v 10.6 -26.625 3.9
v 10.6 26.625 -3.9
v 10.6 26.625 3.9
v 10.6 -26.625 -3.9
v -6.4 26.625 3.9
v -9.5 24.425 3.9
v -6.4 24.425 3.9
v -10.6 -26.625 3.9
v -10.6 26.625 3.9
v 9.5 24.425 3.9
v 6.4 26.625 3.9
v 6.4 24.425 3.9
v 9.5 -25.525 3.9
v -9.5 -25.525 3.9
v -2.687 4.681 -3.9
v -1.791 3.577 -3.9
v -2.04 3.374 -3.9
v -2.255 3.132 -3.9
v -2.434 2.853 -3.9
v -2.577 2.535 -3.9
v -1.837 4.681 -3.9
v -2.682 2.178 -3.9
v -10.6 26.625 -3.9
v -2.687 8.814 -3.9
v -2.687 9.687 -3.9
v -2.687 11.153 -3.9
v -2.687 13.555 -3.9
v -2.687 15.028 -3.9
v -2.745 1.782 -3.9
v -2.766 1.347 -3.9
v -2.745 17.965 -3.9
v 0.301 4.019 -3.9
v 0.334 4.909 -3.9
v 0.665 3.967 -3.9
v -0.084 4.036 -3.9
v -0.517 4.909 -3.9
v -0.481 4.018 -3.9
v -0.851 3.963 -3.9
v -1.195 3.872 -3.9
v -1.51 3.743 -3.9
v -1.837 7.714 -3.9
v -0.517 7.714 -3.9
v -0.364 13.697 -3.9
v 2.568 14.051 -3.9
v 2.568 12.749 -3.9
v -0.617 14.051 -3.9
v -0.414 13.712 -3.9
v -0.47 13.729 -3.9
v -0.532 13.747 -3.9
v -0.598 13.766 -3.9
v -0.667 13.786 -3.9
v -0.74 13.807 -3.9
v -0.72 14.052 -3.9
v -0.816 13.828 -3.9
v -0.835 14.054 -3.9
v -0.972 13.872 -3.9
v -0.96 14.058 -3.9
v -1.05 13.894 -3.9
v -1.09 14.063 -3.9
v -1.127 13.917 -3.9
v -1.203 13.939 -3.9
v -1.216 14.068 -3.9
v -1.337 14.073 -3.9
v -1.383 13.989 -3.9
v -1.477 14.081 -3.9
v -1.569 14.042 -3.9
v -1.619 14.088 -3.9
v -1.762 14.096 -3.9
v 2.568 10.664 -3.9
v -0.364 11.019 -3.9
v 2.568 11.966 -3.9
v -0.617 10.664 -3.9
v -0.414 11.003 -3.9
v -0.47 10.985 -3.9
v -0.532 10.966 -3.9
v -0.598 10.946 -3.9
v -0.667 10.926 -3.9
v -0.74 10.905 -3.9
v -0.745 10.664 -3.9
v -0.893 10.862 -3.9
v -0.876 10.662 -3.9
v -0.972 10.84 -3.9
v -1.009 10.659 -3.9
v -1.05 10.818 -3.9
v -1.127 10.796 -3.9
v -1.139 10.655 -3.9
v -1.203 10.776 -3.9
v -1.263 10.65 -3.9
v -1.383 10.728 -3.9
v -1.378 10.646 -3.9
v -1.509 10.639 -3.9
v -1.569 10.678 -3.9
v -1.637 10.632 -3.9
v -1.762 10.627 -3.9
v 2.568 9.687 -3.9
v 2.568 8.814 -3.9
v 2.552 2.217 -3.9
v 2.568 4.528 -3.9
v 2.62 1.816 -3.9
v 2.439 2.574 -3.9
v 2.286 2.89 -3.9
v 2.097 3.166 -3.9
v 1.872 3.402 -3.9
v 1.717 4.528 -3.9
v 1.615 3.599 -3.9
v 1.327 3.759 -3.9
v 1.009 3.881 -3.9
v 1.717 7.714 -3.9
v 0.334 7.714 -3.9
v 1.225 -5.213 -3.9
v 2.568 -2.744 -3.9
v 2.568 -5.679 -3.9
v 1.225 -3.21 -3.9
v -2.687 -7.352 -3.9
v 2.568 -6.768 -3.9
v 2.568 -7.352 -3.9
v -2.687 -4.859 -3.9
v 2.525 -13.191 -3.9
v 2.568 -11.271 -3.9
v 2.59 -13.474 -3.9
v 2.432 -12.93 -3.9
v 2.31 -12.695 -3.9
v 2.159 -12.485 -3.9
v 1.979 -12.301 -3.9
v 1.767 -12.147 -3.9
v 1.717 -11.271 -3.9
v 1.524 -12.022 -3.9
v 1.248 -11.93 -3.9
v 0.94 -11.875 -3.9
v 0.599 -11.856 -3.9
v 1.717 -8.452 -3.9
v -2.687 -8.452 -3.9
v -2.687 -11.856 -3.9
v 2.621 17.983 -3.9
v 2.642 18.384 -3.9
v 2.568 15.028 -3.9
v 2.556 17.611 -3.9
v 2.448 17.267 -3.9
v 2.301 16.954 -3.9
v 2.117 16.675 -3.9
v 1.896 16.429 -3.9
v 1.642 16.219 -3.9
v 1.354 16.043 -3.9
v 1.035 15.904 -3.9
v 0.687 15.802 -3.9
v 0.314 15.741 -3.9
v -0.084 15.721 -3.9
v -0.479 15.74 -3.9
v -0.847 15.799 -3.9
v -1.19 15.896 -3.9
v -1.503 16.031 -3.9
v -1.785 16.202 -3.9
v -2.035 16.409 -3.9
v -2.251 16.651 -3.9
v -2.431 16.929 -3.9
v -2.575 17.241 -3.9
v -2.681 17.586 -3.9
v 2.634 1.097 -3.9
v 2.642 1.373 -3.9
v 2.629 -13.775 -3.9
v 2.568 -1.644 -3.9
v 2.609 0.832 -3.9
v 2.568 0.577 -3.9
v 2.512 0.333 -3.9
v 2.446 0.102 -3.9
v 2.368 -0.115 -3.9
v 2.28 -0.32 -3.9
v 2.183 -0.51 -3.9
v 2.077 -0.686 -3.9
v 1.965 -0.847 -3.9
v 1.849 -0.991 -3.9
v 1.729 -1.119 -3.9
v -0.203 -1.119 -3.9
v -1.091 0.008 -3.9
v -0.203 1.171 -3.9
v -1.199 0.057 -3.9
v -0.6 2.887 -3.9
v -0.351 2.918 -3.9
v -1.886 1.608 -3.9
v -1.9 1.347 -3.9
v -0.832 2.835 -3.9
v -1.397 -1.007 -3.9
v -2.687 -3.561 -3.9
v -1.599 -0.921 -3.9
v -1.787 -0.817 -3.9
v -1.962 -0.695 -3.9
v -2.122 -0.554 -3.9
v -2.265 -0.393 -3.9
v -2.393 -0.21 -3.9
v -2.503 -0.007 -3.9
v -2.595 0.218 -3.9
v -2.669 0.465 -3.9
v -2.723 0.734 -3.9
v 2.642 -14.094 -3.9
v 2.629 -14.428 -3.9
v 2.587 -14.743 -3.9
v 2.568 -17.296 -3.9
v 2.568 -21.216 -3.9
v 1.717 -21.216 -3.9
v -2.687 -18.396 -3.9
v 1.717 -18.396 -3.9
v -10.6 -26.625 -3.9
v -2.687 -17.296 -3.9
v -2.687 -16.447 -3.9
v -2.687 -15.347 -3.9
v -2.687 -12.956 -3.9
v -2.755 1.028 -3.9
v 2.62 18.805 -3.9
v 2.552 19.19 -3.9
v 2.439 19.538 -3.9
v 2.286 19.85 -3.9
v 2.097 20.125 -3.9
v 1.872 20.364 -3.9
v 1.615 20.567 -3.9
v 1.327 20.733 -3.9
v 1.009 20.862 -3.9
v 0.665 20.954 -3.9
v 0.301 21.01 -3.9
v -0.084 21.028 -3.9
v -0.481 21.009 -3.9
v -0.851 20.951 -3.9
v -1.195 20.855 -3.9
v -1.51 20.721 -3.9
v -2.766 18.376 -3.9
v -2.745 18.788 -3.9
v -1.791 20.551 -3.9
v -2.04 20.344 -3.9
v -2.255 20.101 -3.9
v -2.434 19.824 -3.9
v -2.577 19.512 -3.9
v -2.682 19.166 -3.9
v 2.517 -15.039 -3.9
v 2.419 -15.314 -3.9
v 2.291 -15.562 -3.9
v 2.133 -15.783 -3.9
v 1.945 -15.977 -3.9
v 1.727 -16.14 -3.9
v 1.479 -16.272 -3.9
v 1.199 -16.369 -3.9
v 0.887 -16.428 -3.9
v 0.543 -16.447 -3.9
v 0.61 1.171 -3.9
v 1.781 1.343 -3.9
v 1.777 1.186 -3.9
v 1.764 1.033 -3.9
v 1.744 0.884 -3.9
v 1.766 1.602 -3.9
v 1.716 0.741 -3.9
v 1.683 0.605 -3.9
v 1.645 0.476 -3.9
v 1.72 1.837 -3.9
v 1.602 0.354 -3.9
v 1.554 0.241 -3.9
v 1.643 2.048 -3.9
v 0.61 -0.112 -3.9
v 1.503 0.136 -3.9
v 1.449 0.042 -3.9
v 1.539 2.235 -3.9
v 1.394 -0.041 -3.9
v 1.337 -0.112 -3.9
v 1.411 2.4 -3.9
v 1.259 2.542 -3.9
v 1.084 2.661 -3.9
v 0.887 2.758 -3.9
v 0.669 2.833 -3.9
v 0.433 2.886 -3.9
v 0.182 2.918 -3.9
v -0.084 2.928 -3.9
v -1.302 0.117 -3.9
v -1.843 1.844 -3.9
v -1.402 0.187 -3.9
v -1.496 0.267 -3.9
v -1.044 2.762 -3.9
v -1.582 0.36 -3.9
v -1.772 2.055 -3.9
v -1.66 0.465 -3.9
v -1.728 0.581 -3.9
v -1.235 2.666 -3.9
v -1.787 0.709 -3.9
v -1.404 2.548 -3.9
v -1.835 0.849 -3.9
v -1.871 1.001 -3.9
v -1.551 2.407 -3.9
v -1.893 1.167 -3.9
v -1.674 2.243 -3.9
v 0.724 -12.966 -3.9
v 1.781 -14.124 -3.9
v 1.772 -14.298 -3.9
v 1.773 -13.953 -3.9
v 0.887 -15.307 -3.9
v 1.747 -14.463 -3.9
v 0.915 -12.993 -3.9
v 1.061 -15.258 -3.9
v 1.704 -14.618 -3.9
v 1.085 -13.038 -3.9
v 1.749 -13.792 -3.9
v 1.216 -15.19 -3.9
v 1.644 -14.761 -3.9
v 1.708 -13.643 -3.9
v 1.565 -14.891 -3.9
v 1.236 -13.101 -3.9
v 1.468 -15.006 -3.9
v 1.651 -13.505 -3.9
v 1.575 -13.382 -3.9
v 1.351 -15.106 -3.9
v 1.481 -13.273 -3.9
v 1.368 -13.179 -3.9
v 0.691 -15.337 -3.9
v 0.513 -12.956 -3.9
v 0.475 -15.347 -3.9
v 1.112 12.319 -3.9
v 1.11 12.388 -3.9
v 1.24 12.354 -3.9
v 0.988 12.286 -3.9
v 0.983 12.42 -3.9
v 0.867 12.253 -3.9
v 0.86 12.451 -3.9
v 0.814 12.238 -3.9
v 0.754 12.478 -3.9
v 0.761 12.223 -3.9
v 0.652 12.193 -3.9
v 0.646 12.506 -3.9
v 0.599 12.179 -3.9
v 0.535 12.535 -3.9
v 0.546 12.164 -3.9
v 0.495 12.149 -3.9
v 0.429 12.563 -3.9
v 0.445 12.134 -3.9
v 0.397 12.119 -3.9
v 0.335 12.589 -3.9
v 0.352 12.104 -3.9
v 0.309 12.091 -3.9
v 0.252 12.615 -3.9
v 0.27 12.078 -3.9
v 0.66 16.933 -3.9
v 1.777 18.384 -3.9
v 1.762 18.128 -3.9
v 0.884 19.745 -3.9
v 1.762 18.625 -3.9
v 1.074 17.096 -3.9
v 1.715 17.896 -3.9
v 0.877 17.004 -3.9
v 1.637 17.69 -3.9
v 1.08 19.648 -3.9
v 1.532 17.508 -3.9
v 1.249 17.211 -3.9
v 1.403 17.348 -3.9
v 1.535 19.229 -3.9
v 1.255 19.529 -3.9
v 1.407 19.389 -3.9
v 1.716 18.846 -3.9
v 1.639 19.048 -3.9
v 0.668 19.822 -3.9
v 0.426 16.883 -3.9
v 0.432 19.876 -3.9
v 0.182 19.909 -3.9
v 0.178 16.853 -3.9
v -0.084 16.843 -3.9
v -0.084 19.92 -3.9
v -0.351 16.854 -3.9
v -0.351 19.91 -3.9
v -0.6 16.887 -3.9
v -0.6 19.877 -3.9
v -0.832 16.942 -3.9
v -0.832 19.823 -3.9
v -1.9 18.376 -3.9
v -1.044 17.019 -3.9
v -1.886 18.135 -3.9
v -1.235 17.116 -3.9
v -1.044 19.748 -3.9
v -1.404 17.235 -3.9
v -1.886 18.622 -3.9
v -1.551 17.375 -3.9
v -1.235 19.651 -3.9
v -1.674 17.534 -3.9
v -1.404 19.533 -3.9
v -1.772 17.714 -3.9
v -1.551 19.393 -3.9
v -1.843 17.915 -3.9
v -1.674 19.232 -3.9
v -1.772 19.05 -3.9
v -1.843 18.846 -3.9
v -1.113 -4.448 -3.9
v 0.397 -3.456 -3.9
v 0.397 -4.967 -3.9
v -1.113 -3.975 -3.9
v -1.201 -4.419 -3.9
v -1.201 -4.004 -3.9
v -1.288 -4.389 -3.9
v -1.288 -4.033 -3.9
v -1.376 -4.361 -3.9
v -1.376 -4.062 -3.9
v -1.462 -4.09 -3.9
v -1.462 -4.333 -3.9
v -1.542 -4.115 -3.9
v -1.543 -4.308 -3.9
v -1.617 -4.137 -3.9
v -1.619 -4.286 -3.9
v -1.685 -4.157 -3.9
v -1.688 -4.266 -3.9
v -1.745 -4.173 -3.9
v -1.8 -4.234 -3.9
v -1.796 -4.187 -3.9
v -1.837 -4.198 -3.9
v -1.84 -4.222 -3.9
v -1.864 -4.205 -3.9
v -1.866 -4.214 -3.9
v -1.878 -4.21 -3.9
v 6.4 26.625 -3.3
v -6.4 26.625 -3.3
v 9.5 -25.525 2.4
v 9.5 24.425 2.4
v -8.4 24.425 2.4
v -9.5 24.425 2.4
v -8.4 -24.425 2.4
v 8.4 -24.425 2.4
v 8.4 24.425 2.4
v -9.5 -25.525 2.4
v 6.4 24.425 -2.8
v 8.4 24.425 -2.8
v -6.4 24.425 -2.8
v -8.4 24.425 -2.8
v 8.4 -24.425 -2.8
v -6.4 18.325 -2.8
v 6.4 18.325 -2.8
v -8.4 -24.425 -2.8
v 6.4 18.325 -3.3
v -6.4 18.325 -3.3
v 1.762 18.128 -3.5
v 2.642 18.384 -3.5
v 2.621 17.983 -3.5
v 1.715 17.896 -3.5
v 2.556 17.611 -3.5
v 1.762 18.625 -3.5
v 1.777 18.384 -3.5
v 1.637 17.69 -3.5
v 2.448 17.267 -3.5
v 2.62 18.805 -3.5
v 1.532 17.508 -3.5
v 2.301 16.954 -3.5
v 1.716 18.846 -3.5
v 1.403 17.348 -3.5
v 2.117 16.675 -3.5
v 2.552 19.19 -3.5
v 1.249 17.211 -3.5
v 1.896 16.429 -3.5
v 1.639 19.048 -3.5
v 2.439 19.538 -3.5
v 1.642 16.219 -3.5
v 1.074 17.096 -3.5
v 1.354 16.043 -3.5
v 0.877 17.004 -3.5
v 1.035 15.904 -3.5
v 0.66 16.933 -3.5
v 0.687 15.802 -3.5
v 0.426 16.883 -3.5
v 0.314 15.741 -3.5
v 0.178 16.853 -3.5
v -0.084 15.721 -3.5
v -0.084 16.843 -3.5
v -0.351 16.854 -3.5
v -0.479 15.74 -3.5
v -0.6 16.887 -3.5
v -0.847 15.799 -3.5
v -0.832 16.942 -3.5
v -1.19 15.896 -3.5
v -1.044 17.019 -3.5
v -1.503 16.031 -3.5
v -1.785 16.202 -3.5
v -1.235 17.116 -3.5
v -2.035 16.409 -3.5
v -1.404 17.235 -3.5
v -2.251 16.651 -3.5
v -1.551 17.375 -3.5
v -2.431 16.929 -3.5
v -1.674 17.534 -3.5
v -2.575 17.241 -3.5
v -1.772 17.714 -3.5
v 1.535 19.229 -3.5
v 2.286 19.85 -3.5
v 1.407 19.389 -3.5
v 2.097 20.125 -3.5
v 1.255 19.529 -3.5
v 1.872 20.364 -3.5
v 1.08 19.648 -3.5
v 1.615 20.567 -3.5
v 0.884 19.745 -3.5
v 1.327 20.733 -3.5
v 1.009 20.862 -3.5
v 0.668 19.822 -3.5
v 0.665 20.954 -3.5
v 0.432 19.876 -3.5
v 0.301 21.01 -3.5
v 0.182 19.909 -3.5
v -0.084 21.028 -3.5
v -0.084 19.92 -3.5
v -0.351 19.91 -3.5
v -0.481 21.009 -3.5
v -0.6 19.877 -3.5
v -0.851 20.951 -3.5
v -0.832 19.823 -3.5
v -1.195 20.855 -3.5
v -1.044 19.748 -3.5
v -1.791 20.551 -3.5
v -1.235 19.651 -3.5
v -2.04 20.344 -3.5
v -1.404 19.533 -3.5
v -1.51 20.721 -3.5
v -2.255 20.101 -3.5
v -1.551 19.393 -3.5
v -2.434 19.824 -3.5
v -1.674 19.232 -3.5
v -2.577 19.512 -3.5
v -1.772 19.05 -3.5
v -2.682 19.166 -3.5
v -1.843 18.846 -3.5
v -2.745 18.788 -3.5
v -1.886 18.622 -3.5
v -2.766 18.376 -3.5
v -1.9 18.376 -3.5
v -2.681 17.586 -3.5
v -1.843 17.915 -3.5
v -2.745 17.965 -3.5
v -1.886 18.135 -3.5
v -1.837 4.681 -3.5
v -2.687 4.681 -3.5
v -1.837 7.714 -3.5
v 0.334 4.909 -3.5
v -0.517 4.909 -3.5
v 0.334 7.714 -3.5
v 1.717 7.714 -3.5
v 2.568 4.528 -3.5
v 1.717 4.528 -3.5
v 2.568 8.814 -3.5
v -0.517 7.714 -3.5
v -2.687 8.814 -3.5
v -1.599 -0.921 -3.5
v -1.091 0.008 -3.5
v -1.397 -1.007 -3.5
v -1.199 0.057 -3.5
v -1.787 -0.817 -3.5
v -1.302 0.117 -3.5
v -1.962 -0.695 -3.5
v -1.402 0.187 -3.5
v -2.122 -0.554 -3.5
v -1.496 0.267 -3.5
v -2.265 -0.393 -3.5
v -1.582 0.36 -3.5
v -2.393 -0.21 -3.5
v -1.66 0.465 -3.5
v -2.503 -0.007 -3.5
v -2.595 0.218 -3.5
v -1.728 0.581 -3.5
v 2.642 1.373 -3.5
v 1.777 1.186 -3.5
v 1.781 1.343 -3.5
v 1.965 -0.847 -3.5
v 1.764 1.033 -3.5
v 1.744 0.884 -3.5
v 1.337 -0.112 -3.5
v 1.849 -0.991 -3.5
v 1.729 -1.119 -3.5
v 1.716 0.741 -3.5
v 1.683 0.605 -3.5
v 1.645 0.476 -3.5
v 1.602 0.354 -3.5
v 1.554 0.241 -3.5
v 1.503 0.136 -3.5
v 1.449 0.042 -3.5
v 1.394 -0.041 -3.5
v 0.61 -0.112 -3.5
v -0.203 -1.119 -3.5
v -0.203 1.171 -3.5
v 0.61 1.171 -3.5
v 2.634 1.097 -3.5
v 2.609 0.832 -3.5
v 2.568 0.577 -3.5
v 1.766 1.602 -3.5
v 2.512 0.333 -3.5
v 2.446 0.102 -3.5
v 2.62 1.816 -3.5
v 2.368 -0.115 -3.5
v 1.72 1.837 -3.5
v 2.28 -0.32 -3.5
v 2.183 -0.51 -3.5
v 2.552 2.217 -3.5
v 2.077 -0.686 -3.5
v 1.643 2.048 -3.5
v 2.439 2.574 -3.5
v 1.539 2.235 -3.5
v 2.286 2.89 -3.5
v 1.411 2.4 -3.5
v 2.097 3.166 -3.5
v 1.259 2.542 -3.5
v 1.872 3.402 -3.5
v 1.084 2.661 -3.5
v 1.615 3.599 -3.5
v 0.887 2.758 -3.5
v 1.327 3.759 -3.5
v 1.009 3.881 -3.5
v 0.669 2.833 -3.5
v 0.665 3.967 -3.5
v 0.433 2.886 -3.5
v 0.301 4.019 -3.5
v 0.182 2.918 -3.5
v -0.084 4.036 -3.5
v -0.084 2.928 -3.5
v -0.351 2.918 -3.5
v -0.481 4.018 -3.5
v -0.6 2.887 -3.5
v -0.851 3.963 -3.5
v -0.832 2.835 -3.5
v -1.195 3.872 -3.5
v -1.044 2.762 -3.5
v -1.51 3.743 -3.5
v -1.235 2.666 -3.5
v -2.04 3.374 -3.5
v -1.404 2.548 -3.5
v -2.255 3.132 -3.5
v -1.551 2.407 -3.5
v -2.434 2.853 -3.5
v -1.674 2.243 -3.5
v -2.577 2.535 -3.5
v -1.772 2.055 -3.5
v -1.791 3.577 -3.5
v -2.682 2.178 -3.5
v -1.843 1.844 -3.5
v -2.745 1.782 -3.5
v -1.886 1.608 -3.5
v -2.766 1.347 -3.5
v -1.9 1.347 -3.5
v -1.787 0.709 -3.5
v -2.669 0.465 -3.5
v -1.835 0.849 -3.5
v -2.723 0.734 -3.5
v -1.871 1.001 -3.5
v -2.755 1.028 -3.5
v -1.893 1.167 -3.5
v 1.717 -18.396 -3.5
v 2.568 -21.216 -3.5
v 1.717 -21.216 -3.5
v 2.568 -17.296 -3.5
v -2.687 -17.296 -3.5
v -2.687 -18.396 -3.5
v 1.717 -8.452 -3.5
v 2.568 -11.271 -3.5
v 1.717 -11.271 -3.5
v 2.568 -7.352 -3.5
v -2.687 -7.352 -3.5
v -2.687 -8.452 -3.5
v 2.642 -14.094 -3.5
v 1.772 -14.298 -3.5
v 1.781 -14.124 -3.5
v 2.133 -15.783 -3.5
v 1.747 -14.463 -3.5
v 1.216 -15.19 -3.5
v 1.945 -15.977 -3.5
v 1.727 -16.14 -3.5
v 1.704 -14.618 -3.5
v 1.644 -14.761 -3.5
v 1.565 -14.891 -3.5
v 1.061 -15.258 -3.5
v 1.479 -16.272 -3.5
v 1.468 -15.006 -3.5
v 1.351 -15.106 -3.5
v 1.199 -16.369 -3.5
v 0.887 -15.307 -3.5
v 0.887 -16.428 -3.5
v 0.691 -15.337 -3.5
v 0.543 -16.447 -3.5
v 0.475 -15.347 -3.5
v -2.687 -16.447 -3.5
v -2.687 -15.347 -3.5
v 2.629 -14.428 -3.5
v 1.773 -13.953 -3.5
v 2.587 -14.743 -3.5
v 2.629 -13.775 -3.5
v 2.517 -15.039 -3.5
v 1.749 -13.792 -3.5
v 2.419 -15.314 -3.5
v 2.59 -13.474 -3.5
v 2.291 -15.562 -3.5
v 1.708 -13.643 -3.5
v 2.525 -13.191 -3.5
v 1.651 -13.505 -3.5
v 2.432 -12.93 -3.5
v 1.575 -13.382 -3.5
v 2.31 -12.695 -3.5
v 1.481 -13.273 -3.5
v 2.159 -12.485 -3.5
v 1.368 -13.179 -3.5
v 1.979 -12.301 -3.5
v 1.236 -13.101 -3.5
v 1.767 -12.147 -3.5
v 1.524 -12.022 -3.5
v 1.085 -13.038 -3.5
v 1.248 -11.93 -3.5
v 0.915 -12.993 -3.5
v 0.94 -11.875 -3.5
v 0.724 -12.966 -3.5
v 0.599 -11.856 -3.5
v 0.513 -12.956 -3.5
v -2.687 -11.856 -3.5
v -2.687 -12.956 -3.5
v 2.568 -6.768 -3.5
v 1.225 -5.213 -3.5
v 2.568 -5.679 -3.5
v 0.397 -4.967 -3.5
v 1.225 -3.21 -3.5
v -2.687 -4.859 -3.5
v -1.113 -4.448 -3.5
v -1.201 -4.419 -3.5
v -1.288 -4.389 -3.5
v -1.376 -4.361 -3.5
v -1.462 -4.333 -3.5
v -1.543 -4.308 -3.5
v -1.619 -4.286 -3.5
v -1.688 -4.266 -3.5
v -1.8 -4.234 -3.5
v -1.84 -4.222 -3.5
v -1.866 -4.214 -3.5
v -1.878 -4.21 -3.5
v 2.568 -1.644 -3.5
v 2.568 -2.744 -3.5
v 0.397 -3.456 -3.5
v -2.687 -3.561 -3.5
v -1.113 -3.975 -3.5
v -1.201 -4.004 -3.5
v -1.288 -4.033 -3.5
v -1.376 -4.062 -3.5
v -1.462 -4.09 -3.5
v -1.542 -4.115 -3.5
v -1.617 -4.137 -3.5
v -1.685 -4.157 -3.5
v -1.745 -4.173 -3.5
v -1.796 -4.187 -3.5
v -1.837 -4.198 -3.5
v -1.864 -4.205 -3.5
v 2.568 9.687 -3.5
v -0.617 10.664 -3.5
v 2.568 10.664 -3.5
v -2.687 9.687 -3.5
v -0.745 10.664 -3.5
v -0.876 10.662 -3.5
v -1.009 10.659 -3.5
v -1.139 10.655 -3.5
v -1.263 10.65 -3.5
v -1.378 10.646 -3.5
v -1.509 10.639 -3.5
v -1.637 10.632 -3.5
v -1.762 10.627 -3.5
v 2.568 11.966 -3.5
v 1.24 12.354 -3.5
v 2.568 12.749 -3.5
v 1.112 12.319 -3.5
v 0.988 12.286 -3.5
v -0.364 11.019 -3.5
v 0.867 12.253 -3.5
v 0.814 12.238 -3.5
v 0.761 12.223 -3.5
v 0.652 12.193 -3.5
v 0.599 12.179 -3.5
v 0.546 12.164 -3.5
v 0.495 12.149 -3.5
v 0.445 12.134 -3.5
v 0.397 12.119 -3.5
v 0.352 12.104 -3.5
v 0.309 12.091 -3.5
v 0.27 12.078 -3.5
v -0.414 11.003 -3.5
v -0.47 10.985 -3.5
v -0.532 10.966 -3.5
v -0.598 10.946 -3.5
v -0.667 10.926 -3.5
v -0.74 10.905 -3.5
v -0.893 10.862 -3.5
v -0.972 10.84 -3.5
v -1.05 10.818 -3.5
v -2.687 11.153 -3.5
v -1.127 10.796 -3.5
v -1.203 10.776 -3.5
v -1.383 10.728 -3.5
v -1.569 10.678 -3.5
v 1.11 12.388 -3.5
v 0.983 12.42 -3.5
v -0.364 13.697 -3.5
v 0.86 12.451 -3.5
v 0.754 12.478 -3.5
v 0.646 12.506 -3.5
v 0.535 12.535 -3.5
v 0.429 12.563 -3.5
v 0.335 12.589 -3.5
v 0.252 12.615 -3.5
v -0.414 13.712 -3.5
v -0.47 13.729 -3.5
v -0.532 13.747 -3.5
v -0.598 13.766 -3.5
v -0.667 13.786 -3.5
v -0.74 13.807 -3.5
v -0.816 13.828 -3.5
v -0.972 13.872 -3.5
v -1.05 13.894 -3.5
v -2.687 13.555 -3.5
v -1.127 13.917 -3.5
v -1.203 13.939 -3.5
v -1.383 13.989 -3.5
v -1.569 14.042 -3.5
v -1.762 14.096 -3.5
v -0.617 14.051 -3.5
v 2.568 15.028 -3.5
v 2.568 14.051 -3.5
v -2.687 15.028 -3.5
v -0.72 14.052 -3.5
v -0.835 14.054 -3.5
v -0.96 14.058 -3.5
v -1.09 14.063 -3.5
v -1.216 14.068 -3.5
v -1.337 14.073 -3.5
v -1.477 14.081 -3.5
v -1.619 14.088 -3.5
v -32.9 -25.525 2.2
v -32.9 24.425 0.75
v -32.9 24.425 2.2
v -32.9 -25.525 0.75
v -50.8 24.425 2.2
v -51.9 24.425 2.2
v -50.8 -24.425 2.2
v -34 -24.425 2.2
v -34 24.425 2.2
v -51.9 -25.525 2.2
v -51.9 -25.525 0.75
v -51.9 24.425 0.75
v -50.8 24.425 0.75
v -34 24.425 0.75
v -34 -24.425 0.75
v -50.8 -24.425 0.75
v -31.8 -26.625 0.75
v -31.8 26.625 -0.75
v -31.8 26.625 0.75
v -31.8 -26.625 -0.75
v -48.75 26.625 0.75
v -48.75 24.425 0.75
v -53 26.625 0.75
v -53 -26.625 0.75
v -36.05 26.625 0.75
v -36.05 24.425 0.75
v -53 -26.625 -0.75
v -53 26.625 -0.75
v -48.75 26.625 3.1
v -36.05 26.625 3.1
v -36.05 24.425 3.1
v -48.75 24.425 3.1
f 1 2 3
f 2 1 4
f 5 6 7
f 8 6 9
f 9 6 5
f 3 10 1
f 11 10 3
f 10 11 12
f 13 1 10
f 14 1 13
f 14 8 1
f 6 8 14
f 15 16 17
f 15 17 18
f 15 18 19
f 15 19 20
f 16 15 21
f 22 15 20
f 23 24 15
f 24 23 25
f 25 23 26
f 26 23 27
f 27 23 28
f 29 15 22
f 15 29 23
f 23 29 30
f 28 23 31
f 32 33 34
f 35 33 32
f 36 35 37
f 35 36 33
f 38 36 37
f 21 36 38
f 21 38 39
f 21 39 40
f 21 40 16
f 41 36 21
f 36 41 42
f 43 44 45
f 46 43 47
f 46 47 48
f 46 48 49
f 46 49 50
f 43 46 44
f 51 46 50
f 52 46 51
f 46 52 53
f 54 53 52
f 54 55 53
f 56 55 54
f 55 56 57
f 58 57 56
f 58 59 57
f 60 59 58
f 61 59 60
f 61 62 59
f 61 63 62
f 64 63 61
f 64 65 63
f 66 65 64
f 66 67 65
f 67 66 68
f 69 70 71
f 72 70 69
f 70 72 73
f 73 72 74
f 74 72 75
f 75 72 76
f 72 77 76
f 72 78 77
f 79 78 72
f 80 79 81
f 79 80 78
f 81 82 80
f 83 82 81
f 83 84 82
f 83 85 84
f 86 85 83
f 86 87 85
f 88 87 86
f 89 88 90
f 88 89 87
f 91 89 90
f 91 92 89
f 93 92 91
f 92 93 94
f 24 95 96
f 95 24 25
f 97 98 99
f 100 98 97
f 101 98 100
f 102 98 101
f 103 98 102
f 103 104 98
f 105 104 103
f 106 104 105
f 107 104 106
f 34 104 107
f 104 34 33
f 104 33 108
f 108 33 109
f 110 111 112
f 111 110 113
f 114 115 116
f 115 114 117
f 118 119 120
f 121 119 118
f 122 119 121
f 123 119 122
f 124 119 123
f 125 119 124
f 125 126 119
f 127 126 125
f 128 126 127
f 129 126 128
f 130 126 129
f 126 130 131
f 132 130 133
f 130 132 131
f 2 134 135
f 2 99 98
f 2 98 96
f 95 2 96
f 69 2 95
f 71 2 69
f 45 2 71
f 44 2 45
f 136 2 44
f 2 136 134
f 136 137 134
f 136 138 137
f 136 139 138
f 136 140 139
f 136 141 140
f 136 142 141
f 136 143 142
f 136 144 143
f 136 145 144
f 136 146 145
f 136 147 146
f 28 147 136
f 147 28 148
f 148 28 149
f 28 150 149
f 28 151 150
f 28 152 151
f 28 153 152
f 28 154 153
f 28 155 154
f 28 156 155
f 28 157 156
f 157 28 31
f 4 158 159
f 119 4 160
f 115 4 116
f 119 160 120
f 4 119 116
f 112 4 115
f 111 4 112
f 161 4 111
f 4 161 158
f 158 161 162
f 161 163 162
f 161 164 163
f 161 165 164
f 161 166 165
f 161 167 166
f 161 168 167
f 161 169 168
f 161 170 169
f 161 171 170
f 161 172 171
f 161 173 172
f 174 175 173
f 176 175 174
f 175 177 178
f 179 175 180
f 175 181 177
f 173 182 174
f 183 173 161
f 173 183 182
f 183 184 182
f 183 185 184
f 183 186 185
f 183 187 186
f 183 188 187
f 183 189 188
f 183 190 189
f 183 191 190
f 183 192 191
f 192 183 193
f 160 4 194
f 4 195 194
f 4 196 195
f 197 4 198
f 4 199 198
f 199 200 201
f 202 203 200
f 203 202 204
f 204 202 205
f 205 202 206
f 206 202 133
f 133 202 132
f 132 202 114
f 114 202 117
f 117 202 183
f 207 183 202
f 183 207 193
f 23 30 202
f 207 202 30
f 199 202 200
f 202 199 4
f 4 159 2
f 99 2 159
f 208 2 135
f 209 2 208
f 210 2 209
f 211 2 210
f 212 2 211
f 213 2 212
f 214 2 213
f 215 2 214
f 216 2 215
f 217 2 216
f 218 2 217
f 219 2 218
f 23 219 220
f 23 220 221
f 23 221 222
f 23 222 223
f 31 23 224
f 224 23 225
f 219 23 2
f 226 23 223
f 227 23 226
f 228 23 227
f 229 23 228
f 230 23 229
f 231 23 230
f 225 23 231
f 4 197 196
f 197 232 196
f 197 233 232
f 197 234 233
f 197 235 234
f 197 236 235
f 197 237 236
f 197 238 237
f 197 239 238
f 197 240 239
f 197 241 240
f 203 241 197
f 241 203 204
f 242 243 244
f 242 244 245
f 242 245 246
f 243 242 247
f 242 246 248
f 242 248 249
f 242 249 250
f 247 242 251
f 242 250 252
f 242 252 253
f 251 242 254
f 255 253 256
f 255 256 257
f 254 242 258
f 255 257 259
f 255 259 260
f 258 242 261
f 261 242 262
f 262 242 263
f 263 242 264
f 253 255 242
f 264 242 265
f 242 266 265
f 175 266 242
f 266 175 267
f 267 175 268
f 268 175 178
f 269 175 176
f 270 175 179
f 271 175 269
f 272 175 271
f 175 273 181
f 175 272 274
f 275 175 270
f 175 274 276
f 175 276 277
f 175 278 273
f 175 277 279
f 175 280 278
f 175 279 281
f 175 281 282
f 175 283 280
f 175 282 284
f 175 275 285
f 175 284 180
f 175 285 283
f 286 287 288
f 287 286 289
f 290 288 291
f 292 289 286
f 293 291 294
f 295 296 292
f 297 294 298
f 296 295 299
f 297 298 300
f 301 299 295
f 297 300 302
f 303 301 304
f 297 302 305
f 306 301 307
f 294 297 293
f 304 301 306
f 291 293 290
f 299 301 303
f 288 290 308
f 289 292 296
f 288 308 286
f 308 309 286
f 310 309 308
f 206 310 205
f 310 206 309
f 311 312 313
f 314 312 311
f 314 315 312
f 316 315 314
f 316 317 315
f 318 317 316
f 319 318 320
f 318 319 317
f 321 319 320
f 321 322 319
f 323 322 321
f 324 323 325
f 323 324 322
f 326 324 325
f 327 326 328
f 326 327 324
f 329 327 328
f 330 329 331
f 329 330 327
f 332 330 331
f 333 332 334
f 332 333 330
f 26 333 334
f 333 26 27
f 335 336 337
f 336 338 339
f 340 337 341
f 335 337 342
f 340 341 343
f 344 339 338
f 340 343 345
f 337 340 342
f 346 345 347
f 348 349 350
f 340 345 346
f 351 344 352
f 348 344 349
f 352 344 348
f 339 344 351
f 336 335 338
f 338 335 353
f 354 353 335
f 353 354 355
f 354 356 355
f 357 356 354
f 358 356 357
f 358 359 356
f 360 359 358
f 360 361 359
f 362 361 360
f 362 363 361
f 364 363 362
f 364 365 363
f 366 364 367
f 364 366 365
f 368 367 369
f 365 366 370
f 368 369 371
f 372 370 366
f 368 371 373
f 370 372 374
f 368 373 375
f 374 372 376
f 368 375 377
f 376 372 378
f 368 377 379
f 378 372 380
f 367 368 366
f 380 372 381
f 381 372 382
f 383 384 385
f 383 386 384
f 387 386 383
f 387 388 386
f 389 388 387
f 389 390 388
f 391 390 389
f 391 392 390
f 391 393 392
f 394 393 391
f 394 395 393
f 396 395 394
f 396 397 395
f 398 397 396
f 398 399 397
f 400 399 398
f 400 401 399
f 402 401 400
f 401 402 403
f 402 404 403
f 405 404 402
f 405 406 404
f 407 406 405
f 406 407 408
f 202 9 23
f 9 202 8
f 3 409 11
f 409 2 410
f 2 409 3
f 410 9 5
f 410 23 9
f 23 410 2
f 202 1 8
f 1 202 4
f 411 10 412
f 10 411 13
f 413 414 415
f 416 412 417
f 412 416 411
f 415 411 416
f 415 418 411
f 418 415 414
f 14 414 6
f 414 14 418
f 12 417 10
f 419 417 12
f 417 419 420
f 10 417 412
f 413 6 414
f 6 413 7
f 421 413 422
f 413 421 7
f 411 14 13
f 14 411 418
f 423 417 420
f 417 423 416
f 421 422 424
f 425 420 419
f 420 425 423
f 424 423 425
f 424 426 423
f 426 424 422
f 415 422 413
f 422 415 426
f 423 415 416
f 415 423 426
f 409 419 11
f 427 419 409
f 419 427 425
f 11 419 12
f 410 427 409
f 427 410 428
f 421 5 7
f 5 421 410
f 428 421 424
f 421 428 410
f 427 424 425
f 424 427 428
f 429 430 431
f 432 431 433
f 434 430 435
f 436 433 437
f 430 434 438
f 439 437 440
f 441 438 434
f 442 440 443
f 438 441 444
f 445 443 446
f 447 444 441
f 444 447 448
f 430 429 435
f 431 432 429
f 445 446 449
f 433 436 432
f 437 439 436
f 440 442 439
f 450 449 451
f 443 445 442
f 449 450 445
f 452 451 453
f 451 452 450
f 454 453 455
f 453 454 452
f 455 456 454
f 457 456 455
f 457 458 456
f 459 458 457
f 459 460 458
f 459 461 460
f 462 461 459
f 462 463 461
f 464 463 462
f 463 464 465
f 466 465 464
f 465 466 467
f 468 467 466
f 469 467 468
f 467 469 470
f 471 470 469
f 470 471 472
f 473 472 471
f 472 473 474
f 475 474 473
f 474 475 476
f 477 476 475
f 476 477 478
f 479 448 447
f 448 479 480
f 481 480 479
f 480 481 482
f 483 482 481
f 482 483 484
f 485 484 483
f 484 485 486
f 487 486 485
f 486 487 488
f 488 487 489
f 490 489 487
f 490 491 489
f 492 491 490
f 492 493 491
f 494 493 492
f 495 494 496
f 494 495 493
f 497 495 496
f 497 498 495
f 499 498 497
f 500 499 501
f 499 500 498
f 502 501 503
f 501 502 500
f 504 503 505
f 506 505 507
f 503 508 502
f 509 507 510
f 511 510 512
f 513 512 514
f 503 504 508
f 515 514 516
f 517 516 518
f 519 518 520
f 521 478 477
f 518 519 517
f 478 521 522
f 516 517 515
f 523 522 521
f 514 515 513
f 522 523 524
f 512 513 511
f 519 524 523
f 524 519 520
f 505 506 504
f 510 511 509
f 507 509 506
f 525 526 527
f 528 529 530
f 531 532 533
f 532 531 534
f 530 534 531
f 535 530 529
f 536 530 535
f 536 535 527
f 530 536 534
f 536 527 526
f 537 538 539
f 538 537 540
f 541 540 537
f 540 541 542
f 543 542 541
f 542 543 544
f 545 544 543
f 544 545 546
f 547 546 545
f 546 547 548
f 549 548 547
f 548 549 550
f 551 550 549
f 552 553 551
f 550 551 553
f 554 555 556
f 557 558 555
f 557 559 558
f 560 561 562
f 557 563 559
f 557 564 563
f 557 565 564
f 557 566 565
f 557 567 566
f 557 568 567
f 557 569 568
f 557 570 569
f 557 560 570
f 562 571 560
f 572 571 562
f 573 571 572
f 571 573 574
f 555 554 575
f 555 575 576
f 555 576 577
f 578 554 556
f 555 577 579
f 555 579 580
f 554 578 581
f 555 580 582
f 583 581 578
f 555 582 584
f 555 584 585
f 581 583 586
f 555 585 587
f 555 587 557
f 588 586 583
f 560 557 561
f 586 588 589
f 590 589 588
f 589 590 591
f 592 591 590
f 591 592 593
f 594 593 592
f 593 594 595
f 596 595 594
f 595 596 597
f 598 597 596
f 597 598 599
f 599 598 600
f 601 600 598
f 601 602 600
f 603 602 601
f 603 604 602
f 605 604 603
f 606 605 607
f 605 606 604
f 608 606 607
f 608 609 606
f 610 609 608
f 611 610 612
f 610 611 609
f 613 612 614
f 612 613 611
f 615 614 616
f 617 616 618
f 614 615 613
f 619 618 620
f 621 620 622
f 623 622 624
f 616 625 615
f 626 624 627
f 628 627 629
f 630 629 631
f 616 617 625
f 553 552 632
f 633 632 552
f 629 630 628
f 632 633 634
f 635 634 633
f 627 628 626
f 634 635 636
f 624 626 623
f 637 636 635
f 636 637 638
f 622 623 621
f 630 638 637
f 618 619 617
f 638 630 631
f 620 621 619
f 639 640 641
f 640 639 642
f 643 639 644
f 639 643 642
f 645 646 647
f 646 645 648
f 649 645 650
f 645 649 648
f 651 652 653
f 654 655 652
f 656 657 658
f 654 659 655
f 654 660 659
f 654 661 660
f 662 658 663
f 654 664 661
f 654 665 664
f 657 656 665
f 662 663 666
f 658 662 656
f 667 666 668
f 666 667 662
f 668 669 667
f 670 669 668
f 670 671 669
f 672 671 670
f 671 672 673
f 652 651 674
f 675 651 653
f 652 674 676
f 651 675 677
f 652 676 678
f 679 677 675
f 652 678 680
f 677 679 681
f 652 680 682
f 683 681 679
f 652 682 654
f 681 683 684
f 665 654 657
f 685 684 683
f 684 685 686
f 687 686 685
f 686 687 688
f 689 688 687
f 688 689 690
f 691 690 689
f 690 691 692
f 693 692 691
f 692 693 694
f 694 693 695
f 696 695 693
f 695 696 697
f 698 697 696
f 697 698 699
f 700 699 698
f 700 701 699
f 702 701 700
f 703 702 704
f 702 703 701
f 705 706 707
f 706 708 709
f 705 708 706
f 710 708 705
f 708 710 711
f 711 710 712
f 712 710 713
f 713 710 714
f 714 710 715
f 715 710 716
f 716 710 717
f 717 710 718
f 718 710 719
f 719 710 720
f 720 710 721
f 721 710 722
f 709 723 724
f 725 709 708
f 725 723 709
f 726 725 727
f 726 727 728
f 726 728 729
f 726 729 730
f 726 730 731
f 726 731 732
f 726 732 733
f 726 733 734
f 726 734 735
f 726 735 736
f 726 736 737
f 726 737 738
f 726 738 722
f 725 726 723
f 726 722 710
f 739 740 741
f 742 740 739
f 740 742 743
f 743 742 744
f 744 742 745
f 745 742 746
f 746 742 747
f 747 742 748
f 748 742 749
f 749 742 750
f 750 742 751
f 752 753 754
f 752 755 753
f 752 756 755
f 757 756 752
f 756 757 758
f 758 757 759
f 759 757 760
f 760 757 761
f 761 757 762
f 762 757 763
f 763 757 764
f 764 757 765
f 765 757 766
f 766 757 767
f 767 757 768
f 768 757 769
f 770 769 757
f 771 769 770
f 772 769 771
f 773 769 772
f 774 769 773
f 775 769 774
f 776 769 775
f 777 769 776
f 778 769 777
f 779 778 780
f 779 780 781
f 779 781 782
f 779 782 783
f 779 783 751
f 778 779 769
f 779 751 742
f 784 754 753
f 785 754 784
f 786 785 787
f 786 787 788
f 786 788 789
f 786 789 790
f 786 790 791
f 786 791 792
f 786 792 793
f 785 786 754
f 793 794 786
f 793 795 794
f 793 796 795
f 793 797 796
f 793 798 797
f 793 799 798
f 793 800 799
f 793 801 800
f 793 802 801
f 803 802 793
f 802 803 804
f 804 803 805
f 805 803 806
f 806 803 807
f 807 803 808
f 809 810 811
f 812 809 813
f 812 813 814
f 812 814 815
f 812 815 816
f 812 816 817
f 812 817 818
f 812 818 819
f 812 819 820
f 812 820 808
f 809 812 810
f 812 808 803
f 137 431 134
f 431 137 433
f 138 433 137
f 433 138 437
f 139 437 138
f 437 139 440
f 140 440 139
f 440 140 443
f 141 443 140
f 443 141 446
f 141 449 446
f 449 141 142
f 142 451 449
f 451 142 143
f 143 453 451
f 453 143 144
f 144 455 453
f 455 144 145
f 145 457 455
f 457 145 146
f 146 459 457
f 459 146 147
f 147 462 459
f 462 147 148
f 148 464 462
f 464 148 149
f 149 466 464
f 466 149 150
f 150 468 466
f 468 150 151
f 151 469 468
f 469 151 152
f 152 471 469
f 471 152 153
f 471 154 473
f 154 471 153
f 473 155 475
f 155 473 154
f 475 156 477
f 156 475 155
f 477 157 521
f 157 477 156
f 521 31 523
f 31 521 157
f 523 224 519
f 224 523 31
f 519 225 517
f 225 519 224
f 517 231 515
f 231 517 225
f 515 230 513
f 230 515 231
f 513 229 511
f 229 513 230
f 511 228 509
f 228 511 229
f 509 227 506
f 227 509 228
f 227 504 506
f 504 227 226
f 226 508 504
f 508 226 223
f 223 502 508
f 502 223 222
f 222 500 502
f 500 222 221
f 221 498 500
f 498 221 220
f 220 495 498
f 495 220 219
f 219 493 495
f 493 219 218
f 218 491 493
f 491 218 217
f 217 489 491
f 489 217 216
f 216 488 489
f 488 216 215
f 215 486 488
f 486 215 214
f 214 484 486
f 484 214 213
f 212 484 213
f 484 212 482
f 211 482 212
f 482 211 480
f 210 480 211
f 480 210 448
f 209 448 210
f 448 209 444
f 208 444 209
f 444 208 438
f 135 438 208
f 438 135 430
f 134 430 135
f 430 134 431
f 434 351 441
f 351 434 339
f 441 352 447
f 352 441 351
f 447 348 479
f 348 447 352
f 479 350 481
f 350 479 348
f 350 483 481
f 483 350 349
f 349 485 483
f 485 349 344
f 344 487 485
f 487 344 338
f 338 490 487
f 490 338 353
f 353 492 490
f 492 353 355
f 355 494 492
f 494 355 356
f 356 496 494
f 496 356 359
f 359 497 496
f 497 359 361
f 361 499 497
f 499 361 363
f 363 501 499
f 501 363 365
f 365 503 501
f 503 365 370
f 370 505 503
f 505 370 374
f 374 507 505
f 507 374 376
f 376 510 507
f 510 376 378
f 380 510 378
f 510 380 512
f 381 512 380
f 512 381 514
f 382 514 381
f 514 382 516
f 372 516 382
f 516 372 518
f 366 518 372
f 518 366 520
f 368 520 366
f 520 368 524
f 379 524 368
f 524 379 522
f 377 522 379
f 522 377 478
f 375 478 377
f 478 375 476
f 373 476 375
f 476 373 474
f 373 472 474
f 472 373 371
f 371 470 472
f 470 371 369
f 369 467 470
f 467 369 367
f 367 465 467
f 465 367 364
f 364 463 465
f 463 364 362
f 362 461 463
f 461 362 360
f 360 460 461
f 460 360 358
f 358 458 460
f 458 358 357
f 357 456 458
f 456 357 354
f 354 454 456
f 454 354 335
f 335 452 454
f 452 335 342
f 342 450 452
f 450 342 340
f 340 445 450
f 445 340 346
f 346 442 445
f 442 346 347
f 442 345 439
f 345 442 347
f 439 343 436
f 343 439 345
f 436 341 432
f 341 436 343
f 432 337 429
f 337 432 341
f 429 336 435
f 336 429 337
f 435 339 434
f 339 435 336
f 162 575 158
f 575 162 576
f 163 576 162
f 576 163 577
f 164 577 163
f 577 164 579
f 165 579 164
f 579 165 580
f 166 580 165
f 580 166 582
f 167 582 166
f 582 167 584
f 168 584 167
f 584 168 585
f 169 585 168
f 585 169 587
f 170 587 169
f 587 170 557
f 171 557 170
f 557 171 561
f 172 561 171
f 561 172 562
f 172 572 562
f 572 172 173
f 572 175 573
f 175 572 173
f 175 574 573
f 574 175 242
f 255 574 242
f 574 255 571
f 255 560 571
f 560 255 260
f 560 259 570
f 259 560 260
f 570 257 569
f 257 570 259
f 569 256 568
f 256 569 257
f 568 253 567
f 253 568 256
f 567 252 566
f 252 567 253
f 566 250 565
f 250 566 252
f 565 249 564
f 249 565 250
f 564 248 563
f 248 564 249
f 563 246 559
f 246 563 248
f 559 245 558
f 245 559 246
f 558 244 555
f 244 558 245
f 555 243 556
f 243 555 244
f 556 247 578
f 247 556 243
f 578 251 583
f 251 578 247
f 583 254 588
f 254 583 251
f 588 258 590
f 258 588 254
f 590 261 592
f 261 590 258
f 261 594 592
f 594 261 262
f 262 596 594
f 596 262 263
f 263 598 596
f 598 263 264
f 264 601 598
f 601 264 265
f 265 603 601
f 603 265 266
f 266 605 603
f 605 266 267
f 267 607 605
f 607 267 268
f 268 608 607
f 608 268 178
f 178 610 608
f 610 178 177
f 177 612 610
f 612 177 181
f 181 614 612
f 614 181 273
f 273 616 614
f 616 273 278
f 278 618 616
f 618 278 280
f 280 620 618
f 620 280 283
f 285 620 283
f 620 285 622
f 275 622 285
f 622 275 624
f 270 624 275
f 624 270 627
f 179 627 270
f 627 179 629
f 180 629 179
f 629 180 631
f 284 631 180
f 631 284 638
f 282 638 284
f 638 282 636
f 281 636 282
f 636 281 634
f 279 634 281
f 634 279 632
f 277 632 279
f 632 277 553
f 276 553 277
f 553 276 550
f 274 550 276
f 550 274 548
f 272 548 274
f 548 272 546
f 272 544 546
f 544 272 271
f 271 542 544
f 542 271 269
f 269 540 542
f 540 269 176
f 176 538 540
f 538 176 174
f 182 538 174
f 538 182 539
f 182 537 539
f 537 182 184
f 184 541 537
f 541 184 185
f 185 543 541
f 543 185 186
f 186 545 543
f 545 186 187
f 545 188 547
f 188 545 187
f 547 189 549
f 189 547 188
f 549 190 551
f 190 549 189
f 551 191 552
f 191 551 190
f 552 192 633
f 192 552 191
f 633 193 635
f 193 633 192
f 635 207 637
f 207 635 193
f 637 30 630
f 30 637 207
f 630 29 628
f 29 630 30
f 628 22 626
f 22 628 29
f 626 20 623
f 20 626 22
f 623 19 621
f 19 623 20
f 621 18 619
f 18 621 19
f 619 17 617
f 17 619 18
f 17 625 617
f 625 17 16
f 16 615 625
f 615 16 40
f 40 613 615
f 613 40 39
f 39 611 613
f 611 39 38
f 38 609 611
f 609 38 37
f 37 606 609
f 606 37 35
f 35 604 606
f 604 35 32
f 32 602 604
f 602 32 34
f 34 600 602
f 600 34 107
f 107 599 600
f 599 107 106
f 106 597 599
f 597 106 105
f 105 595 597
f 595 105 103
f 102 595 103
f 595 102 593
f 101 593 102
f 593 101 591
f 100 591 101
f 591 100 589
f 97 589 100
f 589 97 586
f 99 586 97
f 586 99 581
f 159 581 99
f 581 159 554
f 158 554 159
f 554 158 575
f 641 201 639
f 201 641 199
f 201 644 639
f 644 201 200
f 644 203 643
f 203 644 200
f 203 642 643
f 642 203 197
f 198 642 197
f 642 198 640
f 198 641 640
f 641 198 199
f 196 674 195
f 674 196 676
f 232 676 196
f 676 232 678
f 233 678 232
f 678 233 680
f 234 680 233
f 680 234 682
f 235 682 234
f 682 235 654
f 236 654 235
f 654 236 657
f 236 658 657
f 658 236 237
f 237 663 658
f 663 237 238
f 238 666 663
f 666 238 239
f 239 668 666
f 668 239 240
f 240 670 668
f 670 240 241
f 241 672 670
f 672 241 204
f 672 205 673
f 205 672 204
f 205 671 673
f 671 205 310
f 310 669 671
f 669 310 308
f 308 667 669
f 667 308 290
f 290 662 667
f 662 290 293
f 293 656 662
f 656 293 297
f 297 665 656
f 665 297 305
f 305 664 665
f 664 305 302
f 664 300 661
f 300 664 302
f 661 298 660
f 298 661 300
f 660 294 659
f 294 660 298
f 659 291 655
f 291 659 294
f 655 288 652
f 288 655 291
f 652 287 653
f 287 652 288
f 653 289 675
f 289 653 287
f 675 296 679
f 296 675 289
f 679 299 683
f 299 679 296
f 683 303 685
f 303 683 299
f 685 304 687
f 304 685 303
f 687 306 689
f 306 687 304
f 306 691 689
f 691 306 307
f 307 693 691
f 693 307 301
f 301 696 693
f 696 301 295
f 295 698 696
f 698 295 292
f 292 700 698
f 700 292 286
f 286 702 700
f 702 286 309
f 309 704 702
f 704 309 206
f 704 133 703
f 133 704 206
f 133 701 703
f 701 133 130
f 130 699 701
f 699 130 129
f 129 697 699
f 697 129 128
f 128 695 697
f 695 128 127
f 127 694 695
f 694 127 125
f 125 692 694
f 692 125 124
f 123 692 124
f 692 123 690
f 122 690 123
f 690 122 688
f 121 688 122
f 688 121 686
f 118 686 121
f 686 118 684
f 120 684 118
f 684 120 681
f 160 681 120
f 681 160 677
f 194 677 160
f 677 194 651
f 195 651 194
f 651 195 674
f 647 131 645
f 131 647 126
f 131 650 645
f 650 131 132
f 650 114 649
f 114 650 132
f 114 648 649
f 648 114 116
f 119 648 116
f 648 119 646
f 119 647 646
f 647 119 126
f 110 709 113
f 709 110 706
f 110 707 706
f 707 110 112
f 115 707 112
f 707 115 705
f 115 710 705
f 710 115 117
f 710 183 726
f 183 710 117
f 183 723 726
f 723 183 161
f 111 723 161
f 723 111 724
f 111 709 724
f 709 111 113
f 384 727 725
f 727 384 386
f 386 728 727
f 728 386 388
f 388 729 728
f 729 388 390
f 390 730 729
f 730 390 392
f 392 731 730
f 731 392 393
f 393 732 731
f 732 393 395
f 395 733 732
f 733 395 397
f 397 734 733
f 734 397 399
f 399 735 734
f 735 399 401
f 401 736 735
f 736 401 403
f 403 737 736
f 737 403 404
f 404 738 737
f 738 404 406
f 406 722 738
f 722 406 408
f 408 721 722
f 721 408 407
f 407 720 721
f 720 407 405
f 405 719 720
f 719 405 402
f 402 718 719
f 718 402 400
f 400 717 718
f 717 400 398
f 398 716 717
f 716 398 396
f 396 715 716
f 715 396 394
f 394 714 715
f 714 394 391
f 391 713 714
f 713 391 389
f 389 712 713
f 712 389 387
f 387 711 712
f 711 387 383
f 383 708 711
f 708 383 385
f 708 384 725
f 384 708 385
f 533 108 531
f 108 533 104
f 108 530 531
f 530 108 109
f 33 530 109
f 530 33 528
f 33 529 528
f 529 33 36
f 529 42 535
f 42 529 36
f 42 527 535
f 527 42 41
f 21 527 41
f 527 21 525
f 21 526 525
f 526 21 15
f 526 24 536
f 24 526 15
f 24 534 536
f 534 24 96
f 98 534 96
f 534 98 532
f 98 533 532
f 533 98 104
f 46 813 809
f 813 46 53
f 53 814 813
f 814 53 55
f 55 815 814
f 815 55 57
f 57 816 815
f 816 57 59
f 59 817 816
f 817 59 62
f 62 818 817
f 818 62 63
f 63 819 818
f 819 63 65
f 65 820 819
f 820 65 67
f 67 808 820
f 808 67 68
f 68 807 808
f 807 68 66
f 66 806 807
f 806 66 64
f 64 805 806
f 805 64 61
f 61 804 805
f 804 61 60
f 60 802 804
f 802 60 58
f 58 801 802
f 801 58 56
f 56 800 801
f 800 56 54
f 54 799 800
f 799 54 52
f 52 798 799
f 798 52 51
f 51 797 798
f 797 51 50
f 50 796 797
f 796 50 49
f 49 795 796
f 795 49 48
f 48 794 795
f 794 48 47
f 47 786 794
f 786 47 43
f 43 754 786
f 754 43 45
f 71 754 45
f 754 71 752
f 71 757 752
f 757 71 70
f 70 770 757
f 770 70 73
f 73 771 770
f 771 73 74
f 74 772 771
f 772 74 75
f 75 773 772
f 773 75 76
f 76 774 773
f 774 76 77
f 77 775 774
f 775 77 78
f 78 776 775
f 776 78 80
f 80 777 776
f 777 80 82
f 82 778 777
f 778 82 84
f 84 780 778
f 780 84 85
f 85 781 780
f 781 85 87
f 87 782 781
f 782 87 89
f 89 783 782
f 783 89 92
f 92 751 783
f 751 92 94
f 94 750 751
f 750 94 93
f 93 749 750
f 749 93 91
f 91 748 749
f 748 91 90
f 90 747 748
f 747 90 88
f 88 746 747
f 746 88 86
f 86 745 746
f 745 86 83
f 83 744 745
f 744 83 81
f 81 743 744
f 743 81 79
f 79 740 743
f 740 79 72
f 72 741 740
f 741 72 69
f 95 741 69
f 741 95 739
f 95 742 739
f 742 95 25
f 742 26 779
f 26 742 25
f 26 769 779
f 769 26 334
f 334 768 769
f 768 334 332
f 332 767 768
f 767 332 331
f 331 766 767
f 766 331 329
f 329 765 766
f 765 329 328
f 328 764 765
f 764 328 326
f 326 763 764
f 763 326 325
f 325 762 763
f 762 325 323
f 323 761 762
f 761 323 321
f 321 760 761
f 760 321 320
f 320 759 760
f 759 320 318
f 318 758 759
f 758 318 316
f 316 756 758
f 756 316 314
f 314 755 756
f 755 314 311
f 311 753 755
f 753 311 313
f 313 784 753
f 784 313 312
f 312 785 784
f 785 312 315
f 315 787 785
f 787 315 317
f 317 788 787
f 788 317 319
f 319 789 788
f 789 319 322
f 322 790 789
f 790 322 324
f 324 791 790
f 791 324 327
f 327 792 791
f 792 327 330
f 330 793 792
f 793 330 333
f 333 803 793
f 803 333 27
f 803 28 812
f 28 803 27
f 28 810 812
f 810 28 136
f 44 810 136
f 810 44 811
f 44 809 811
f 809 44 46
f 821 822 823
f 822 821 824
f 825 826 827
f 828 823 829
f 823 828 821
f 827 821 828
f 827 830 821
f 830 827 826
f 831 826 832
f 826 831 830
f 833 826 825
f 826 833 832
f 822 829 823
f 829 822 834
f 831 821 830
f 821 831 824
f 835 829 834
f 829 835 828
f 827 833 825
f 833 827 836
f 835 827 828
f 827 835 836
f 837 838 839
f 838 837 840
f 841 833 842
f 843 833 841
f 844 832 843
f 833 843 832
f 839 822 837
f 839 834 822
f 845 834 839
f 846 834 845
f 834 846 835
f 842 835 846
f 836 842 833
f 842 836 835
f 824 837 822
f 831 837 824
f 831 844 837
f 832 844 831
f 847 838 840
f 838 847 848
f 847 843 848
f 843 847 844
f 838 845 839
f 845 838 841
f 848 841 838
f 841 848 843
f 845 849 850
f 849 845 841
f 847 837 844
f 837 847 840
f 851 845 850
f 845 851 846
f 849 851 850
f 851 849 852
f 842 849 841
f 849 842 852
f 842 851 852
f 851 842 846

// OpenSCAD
// Configurable USB Drive case for 3D printing.
// Made by Julian G, 2021-05-25

/* [Generation options] */
generate_case = true;
generate_cover = true;
debug_show_body_and_plug = true;

// Render the cover above the case
show_preview = false;
preview_distance = 7;

/* [USB Port hole] */
port_width = 12.8;
port_height = 4.75;
port_length = 15.5;
// Distance of the port to the bottom of the body
port_z_offset = -0.5;
// How much the port is pushed into the body. Allows to lower the case at the port. Only applicable with port_z_offset < 0
port_in_body_length = 6.1;
// Width and height tolerance for the port lid on the cover
port_lid_tolerance = 0.1;

/* [Inner dimensions] */
body_width = 16.8;
body_length = 48.85;
body_height = 5.6;

/* [Outter dimensions] */
case_thickness = 2.2;
top_cover_height = 1.5;

/* [Case Label] */
add_case_label = true;
label_text = "OMEGALUL";
label_font = "Liberation Sans:style=bold";
label_size = 5.5;
label_extrude_depth = 0.5;

/* [Frame dimensions] */
frame_thickness = 1.1;
frame_height = 1.5;
frame_height_tolerance = 0.05;

// helper variables
outter_width = body_width + case_thickness*2;
outter_length = body_length + case_thickness*2;
outter_case_height = body_height + case_thickness;
port_lid_height = body_height - port_height - port_z_offset - port_lid_tolerance + case_thickness/2;
echo(str("port_lid_height=", port_lid_height));
port_lid_width = port_width - port_lid_tolerance;



module body()
{
	cube([body_width, body_length, body_height], center=true);
}

module port(make_high = true)
{
	tempHeightOffset = make_high ? outter_case_height : 0;
	translate([0, (body_length+port_length-port_in_body_length)/2, (body_height - port_height)/-2 + port_z_offset + tempHeightOffset/2])
	cube([port_width, port_length+port_in_body_length, port_height+tempHeightOffset], center=true);
}

module case()
{
	// translate([0, 0, wall / (-2)])
	difference() {
		cube([outter_width, outter_length, outter_case_height], center=true);
		translate([0, frame_thickness / -2, (outter_case_height - frame_height)/2])
		frame_cube(fix_openscad_bs_z = true);
	}
}

module case_label()
{
	translate([0, 0, 0.1])
	linear_extrude(height = label_extrude_depth + 0.1)
	text(
		text = label_text,
		valign = "center",
		halign = "center",
		font = label_font,
		size = label_size
	);
}

module frame_cube(fix_openscad_bs_z = false)
{
	// because open scad visual glitches
	heightOffset = fix_openscad_bs_z ? 1 : 0;
	translate([0, 0, heightOffset/2])
	cube([
		outter_width - frame_thickness*2,
		outter_length - frame_thickness*3,
		frame_height + heightOffset
	], center=true);
}

module frame_inner()
{
	translate([0, frame_thickness / 2 + 0.5, 0])
	cube([
		body_width,
		body_length + 1,
		frame_height * 1.1
	], center=true);
}

module top_cover()
{
	union()
	{
		cube([outter_width, outter_length, top_cover_height], center=true);
		translate([0, (outter_length-case_thickness)/2, (top_cover_height+port_lid_height)/2])
		cube([port_lid_width, case_thickness, port_lid_height], center=true);
	}
}

module main_case()
{
	difference()
	{
		case();
		body();
		port();
		if (add_case_label)
		{
			translate([0, 0, outter_case_height/-2 + label_extrude_depth])
			rotate([0, 180, 90])
			case_label();
		}
	}
}

module main_cover()
{
	union()
	{
		translate([0, frame_thickness / -2, frame_height - frame_height_tolerance])
		difference() {
			frame_cube();
			frame_inner();
		}
		top_cover();
	}
}


// ================== RENDERING ==================

if (debug_show_body_and_plug)
{
	% union()
	{
		port(false);
		body();
	}
}

if (generate_case)
{
	main_case();
}

if (generate_cover)
{
	if (show_preview)
	{
		translate([0,0, outter_case_height + preview_distance])
		rotate([0, 180, 0])
		main_cover();
	}
	else
	{
		translate([outter_width * -2, 0, 0])
		main_cover();
	}
}
